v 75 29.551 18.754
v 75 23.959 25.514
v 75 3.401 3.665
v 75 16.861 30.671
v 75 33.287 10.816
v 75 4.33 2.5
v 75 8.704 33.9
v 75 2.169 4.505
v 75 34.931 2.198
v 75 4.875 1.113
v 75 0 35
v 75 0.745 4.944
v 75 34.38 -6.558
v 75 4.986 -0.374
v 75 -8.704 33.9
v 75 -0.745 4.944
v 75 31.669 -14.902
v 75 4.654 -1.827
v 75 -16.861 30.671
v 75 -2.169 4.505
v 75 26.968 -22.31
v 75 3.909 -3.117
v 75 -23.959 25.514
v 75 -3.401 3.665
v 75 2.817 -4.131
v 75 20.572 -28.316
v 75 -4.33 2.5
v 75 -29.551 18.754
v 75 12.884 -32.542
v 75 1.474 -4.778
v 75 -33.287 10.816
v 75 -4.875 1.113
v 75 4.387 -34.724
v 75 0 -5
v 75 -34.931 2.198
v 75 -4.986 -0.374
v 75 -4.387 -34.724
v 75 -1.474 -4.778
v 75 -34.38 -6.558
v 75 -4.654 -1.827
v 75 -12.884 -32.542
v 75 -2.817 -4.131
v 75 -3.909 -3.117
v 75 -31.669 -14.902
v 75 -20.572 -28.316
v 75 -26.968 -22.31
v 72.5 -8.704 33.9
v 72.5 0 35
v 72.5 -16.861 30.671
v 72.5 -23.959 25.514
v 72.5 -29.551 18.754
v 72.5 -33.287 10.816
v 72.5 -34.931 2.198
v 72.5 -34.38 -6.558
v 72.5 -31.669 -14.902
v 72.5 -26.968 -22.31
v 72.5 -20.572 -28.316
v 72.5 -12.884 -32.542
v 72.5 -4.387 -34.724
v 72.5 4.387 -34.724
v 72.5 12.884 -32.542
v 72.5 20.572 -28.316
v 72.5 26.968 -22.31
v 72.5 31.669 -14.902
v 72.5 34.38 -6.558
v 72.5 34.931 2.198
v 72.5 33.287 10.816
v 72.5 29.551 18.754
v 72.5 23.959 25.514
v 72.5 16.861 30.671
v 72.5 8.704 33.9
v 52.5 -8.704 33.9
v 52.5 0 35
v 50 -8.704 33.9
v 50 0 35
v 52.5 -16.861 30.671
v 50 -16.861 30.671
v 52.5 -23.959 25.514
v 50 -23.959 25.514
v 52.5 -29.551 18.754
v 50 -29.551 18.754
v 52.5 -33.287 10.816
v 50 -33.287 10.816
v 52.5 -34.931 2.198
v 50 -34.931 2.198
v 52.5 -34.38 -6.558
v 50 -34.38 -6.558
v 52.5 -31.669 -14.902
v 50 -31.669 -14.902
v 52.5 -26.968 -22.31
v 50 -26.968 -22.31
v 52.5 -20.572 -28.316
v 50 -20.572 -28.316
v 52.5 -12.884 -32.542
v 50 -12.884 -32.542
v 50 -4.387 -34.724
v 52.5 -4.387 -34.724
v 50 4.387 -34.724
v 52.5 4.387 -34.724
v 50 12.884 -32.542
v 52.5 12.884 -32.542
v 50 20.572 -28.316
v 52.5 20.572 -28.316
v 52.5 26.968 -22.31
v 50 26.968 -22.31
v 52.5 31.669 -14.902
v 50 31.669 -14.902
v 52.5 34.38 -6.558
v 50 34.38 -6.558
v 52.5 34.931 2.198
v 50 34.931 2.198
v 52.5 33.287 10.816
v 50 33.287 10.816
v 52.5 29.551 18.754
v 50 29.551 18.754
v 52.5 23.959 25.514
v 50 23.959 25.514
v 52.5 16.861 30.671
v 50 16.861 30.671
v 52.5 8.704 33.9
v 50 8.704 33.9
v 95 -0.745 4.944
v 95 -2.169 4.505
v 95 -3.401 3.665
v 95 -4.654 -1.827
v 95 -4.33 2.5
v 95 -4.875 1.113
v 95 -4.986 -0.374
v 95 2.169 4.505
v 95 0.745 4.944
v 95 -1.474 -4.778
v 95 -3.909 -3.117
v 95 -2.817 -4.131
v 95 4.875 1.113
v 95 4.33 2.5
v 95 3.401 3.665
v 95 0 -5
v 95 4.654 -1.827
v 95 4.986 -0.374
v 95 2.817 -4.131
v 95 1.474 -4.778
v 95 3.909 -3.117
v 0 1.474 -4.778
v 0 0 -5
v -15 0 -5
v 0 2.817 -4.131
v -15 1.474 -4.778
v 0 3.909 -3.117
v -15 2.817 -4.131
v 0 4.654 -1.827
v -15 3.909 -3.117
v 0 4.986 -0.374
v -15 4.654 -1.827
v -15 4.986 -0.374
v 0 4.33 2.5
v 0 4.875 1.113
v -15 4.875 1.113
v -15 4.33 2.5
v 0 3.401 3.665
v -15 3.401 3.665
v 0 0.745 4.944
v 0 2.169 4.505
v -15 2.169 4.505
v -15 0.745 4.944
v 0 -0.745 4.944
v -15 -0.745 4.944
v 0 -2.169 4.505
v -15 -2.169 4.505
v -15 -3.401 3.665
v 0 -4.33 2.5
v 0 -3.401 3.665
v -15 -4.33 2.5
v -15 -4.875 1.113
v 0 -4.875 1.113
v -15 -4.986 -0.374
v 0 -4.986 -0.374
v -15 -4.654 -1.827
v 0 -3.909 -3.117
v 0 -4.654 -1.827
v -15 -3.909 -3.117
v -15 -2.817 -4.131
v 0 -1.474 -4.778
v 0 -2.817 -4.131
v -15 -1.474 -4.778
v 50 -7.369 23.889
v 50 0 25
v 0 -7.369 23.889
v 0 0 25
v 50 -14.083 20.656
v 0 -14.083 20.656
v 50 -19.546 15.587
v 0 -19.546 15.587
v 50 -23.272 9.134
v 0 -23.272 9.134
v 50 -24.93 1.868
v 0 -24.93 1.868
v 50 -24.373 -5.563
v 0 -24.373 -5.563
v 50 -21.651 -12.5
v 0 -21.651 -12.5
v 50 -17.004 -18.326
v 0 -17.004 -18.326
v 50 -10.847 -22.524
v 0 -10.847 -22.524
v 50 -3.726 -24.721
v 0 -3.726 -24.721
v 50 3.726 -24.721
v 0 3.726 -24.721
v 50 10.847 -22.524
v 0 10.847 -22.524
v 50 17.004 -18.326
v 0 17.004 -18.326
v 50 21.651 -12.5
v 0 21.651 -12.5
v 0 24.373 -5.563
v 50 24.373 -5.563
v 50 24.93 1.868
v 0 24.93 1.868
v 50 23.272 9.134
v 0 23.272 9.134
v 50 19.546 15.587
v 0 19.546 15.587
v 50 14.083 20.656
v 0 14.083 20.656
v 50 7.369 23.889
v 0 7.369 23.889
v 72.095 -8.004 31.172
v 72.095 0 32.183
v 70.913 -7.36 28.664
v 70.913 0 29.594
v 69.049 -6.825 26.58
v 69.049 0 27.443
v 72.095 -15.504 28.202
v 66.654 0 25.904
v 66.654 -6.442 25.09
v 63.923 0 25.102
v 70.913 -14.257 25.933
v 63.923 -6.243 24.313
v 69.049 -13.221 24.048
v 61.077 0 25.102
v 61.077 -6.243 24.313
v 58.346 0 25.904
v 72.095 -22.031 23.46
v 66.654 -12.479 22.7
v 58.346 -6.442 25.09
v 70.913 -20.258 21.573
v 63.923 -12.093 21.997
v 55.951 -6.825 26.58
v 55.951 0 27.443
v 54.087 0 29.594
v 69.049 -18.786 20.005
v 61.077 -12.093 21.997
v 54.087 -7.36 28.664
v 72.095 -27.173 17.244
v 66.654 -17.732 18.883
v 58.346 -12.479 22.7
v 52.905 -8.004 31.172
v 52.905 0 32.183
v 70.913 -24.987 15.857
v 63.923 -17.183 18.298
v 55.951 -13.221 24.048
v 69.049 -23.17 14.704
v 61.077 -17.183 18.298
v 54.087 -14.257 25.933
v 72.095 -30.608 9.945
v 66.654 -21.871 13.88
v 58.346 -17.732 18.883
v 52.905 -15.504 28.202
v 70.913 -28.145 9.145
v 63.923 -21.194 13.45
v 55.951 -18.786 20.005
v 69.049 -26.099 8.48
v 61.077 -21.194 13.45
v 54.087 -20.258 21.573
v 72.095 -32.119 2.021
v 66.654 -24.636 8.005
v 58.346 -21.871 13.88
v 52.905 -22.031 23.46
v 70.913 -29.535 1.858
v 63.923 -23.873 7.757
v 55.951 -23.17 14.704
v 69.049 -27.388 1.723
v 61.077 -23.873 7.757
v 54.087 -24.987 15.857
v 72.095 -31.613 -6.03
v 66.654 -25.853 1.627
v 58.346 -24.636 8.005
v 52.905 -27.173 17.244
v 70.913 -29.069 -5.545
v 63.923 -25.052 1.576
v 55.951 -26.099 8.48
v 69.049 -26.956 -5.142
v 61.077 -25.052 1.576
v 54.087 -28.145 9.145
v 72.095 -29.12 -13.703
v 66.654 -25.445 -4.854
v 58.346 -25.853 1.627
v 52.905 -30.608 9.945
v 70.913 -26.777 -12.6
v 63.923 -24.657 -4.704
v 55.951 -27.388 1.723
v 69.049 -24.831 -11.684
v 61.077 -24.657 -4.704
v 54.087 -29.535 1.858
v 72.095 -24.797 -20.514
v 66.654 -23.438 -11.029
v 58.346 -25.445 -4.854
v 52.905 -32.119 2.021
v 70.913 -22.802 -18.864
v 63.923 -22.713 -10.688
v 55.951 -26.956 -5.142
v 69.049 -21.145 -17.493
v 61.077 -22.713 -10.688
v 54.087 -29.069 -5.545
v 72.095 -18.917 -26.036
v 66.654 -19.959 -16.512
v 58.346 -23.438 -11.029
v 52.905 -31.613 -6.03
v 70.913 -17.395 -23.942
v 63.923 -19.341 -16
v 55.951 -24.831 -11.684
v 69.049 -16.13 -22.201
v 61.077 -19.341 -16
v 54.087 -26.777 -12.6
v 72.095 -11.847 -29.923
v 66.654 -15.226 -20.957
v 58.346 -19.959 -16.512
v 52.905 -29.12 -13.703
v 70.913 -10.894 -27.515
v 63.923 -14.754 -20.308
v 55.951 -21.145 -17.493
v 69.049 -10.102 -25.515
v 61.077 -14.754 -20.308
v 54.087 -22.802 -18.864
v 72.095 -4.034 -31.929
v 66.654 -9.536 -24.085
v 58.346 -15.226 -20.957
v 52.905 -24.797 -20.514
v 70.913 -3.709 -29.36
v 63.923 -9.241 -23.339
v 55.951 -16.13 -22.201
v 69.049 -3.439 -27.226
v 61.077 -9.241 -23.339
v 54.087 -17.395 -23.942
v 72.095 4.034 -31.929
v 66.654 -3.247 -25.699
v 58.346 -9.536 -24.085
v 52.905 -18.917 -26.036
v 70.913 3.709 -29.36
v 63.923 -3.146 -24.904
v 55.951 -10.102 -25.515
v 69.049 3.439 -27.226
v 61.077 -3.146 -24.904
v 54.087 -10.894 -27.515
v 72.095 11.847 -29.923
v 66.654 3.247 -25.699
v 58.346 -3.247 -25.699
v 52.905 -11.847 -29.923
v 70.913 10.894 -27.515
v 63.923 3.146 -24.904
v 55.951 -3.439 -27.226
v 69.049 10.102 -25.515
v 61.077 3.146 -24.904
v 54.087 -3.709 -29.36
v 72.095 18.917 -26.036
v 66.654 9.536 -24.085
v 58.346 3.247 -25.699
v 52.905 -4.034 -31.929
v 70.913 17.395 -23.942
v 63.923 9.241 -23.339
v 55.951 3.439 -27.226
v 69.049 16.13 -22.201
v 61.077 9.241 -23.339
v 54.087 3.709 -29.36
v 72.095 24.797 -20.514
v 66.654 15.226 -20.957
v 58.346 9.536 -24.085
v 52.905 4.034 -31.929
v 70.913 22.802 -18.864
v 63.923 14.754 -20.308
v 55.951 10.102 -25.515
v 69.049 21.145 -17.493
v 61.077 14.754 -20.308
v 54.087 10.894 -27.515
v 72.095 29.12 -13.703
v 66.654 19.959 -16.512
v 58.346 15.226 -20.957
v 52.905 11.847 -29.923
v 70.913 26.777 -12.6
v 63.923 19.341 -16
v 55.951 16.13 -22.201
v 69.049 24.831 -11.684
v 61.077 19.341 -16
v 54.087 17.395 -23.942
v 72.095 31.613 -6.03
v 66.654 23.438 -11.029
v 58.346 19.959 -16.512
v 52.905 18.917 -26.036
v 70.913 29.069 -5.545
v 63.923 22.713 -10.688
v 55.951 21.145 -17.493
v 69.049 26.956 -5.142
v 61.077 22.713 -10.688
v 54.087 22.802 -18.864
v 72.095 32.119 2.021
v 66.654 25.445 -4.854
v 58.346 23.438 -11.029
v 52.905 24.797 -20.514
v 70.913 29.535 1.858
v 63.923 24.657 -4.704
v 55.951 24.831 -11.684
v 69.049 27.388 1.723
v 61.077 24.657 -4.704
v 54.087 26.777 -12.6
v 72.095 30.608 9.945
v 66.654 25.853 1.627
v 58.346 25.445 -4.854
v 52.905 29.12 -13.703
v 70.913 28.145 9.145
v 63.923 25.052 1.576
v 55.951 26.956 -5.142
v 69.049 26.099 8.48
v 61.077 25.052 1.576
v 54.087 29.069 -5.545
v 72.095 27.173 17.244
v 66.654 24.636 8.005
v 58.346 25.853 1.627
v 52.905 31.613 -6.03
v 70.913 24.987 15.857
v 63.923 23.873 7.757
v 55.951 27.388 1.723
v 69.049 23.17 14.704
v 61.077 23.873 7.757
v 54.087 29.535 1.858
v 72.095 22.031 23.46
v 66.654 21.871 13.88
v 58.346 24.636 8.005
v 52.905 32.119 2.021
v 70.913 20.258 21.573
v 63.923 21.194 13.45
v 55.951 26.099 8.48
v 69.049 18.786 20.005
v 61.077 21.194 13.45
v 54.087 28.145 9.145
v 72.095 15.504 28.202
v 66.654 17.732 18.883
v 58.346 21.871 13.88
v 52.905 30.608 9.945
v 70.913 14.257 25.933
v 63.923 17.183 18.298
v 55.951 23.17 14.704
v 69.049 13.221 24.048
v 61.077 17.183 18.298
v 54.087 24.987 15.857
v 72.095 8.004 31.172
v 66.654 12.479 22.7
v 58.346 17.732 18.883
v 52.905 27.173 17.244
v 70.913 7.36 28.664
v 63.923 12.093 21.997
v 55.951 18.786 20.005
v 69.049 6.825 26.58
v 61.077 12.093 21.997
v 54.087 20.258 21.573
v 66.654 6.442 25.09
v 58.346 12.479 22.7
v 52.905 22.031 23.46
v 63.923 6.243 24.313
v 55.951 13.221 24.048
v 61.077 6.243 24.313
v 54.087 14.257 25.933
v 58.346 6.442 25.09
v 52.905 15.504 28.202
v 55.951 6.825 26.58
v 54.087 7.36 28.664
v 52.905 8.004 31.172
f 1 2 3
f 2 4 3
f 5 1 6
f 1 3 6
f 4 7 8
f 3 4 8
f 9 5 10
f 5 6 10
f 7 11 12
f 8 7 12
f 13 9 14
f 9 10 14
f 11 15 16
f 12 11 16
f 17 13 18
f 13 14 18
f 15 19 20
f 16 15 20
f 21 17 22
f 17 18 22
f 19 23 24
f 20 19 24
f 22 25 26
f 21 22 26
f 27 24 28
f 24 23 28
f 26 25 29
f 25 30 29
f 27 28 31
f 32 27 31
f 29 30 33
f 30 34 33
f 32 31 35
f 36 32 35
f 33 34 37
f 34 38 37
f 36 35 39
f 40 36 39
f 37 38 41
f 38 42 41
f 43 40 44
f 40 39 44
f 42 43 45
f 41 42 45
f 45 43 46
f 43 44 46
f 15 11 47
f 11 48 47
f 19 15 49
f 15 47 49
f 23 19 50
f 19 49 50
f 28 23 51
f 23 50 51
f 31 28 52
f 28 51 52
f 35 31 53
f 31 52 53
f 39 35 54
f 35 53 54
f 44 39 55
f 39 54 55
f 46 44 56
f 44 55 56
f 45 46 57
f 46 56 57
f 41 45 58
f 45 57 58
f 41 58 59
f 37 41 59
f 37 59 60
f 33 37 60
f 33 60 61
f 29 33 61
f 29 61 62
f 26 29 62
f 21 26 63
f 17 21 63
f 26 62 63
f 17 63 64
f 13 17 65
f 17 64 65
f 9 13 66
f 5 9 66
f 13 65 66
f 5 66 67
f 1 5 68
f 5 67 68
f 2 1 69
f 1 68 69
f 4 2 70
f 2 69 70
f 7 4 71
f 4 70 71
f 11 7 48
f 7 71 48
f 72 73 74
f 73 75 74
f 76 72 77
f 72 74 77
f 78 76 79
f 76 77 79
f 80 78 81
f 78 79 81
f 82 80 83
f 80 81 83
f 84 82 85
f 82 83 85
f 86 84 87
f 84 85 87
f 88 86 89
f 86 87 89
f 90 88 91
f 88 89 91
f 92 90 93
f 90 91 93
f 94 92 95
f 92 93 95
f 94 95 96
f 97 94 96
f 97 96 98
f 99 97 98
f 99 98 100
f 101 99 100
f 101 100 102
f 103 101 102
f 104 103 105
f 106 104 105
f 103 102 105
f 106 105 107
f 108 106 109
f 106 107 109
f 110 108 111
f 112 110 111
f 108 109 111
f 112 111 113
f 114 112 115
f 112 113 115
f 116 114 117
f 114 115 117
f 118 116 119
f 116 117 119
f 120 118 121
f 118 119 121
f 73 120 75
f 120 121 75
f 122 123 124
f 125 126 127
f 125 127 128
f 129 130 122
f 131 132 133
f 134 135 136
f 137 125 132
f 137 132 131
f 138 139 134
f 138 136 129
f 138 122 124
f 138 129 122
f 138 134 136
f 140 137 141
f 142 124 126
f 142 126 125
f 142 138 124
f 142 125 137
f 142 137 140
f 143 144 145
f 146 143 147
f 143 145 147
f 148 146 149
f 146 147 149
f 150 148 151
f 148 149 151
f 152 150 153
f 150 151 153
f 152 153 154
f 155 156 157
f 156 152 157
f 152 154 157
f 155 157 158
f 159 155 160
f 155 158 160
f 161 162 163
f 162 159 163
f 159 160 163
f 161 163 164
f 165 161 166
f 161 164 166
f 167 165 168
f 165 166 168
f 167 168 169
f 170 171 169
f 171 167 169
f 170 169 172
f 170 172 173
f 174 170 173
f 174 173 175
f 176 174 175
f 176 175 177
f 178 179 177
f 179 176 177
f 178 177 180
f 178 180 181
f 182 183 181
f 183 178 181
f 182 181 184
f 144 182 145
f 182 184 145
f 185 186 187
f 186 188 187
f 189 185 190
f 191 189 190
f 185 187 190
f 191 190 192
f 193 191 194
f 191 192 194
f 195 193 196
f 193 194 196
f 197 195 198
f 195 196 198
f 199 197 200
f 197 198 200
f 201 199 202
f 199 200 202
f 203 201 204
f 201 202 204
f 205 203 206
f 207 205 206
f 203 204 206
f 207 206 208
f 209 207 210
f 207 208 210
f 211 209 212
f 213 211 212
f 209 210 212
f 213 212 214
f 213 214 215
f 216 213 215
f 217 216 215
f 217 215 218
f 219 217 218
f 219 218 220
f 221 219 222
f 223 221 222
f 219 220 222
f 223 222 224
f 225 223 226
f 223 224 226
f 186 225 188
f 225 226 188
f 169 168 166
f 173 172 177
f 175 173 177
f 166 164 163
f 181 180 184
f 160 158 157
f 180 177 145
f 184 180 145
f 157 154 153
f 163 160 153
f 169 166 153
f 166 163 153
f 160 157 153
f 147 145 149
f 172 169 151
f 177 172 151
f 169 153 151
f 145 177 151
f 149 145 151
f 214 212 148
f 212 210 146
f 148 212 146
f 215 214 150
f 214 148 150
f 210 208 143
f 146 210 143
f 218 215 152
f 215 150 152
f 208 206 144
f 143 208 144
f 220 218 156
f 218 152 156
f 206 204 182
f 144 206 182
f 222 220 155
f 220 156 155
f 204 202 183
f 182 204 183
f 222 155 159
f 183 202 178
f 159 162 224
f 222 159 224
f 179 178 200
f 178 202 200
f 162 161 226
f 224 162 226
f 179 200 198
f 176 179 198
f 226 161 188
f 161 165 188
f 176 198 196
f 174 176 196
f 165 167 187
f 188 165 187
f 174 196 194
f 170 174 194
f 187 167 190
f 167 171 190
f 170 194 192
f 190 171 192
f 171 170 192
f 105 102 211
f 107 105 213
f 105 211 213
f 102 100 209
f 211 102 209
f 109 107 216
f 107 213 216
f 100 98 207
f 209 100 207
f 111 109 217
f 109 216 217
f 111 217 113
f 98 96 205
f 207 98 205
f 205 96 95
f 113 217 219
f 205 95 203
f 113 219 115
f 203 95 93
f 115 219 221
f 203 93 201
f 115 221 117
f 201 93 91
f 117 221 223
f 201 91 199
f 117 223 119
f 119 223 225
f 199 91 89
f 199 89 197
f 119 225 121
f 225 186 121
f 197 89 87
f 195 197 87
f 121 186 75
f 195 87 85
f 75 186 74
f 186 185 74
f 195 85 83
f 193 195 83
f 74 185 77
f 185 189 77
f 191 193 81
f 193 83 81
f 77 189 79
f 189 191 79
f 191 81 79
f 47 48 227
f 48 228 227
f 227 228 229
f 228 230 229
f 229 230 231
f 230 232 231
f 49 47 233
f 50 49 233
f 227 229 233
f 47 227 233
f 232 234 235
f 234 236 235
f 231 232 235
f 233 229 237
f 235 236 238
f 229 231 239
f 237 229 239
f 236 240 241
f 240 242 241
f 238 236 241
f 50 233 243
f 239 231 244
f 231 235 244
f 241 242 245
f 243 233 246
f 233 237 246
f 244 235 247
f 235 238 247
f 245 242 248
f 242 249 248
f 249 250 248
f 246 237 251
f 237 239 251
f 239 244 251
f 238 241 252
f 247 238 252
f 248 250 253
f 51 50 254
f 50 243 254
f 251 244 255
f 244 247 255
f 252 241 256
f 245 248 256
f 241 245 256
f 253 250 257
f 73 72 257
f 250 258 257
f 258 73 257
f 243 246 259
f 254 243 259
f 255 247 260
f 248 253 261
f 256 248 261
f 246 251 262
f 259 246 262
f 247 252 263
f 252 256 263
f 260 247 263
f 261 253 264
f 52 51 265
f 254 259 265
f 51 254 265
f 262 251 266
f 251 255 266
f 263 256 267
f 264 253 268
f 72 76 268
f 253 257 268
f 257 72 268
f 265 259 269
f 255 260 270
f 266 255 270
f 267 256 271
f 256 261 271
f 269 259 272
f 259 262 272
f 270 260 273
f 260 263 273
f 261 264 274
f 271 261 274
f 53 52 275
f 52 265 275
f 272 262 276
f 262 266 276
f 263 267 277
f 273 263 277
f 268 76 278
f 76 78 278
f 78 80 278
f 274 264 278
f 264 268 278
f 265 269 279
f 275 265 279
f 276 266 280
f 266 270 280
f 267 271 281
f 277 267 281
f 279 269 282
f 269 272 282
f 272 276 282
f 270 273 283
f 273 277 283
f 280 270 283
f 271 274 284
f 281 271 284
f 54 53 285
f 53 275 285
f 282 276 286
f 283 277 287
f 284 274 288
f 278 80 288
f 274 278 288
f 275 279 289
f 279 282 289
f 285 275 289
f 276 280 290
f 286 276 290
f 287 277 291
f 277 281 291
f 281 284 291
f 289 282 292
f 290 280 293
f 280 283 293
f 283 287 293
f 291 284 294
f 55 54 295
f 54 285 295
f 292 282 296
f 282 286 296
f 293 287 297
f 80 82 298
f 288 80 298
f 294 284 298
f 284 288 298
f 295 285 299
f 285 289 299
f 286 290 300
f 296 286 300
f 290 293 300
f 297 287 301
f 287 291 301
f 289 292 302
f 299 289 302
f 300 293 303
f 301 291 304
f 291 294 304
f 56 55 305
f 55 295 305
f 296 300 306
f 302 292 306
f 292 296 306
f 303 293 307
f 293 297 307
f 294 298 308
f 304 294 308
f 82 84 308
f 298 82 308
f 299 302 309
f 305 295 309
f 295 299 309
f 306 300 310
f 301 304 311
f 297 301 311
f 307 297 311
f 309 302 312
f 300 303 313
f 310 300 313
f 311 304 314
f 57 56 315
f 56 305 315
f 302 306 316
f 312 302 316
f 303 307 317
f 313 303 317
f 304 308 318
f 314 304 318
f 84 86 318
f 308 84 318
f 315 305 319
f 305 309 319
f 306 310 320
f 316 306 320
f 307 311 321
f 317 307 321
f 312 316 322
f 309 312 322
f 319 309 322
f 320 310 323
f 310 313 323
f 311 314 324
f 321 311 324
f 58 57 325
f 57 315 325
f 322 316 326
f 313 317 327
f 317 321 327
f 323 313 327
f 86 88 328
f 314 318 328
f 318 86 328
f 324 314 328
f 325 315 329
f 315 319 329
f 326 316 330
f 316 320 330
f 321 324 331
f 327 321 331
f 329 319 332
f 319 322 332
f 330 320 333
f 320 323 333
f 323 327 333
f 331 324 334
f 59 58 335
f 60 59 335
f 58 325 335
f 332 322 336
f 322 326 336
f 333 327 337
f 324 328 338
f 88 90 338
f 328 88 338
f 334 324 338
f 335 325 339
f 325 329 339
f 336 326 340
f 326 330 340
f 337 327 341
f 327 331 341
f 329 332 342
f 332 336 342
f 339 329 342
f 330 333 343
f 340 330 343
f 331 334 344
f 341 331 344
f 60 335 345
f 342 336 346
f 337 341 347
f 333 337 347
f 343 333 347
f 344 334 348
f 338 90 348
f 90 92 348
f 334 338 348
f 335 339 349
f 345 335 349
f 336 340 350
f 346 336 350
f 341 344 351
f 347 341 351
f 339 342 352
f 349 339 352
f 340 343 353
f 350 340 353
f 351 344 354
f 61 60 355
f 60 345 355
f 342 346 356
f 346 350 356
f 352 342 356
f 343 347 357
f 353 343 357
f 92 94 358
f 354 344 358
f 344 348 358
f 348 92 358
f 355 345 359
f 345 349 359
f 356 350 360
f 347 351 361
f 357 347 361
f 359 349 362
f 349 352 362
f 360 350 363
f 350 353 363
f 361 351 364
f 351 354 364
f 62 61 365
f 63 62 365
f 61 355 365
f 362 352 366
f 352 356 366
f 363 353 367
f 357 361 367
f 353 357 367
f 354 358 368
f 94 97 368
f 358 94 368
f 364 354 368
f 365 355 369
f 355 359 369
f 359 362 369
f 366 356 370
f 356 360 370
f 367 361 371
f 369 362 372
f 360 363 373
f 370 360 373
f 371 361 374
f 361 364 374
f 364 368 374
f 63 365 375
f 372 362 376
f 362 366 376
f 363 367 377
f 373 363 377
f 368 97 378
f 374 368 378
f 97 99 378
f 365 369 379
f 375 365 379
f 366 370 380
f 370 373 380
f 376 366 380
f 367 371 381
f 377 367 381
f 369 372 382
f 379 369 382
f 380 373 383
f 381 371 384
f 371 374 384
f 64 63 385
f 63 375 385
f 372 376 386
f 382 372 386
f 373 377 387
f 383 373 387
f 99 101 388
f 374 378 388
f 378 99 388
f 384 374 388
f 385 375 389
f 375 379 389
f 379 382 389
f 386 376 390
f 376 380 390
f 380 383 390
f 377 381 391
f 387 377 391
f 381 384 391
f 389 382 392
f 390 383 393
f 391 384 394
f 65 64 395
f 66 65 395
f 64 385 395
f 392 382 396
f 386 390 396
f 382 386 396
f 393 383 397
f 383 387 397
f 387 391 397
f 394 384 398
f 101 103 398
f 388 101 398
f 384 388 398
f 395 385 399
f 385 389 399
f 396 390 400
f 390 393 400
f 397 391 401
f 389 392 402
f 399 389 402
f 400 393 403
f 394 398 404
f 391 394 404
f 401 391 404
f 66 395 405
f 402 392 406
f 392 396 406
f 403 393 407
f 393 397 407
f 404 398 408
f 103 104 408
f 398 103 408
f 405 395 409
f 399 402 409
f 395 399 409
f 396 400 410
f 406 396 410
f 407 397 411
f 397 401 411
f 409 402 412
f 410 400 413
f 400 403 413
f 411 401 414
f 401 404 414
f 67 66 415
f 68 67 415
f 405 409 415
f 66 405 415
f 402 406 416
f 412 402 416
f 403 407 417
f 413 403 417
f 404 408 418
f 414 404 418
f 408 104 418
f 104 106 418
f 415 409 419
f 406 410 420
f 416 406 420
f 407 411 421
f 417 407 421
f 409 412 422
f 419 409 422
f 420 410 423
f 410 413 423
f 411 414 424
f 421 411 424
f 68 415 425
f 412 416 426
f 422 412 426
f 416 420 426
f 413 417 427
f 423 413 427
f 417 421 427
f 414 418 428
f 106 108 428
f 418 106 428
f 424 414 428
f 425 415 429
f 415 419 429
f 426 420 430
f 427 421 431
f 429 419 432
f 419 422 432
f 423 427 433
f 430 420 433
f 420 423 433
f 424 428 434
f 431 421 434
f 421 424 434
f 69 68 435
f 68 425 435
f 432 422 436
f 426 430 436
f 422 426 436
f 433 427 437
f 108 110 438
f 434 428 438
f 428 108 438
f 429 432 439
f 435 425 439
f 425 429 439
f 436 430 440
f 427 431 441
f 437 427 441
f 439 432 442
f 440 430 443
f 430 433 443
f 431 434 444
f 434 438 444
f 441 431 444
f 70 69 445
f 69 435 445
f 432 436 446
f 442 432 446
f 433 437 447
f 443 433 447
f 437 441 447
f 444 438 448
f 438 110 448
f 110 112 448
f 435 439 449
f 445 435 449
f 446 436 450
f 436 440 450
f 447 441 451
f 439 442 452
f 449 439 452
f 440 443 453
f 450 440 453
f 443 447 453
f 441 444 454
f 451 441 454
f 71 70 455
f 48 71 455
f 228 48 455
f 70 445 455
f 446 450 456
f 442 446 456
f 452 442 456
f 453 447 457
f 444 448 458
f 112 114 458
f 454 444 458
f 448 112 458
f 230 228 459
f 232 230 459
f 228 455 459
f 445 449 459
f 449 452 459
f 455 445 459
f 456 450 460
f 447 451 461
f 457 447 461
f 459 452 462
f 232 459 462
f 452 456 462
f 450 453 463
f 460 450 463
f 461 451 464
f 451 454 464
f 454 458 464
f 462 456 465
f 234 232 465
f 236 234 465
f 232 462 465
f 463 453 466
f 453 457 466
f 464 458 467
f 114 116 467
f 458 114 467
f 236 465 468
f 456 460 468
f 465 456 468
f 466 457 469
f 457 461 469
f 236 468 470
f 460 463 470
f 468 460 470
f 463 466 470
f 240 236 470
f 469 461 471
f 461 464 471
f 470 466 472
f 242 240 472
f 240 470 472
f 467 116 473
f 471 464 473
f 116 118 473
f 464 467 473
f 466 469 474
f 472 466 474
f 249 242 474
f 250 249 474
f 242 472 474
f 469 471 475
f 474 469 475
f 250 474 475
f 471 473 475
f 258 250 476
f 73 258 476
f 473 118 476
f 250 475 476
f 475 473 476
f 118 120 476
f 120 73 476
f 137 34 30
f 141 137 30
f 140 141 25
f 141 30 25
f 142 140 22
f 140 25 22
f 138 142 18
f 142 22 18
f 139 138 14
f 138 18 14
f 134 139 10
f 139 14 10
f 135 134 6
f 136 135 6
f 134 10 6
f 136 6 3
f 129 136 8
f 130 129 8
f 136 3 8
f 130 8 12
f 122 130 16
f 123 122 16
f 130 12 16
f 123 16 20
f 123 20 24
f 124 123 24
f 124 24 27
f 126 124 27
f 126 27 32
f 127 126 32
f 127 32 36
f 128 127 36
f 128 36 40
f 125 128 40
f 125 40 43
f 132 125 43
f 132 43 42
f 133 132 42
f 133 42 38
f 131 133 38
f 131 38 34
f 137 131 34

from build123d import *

# Parameters (mm, degrees)
BOSS_EXTRUDE3_DEPTH      = 20
BOSS_EXTRUDE3_DEPTH_BACK = 90
SKETCH5_R                = 5


with BuildPart() as part:
    # Sketch4 → Revolve1 (revolve)
    with BuildSketch(Plane.XY, mode=Mode.PRIVATE) as revolve1_sk:
        with BuildLine():
            Line((0, 0), (75, 0))
            Line((75, 0), (75, 35))
            Line((75, 35), (72.5, 35))
            ThreePointArc((72.5, 35), (62.5, 25), (52.5, 35))
            Line((52.5, 35), (50, 35))
            Line((50, 35), (50, 25))
            Line((50, 25), (0, 25))
            Line((0, 25), (0, 0))
        make_face()
    revolve(revolve1_sk.sketch.rotate(Axis((0, 0, 0), (1, 0, 0)), 90), axis=Axis((0, 0, 0), (1, 0, 0)))

    # Sketch5 → Boss-Extrude3 (add, two sides: drawn at the far end of the back side and taken through both)
    with BuildSketch(Plane(origin=(75, 0, 0), x_dir=(0, 0, -1), z_dir=(1, 0, 0)).offset(-BOSS_EXTRUDE3_DEPTH_BACK)):
        Circle(SKETCH5_R)
    extrude(amount=BOSS_EXTRUDE3_DEPTH + BOSS_EXTRUDE3_DEPTH_BACK)


solid = part.part
